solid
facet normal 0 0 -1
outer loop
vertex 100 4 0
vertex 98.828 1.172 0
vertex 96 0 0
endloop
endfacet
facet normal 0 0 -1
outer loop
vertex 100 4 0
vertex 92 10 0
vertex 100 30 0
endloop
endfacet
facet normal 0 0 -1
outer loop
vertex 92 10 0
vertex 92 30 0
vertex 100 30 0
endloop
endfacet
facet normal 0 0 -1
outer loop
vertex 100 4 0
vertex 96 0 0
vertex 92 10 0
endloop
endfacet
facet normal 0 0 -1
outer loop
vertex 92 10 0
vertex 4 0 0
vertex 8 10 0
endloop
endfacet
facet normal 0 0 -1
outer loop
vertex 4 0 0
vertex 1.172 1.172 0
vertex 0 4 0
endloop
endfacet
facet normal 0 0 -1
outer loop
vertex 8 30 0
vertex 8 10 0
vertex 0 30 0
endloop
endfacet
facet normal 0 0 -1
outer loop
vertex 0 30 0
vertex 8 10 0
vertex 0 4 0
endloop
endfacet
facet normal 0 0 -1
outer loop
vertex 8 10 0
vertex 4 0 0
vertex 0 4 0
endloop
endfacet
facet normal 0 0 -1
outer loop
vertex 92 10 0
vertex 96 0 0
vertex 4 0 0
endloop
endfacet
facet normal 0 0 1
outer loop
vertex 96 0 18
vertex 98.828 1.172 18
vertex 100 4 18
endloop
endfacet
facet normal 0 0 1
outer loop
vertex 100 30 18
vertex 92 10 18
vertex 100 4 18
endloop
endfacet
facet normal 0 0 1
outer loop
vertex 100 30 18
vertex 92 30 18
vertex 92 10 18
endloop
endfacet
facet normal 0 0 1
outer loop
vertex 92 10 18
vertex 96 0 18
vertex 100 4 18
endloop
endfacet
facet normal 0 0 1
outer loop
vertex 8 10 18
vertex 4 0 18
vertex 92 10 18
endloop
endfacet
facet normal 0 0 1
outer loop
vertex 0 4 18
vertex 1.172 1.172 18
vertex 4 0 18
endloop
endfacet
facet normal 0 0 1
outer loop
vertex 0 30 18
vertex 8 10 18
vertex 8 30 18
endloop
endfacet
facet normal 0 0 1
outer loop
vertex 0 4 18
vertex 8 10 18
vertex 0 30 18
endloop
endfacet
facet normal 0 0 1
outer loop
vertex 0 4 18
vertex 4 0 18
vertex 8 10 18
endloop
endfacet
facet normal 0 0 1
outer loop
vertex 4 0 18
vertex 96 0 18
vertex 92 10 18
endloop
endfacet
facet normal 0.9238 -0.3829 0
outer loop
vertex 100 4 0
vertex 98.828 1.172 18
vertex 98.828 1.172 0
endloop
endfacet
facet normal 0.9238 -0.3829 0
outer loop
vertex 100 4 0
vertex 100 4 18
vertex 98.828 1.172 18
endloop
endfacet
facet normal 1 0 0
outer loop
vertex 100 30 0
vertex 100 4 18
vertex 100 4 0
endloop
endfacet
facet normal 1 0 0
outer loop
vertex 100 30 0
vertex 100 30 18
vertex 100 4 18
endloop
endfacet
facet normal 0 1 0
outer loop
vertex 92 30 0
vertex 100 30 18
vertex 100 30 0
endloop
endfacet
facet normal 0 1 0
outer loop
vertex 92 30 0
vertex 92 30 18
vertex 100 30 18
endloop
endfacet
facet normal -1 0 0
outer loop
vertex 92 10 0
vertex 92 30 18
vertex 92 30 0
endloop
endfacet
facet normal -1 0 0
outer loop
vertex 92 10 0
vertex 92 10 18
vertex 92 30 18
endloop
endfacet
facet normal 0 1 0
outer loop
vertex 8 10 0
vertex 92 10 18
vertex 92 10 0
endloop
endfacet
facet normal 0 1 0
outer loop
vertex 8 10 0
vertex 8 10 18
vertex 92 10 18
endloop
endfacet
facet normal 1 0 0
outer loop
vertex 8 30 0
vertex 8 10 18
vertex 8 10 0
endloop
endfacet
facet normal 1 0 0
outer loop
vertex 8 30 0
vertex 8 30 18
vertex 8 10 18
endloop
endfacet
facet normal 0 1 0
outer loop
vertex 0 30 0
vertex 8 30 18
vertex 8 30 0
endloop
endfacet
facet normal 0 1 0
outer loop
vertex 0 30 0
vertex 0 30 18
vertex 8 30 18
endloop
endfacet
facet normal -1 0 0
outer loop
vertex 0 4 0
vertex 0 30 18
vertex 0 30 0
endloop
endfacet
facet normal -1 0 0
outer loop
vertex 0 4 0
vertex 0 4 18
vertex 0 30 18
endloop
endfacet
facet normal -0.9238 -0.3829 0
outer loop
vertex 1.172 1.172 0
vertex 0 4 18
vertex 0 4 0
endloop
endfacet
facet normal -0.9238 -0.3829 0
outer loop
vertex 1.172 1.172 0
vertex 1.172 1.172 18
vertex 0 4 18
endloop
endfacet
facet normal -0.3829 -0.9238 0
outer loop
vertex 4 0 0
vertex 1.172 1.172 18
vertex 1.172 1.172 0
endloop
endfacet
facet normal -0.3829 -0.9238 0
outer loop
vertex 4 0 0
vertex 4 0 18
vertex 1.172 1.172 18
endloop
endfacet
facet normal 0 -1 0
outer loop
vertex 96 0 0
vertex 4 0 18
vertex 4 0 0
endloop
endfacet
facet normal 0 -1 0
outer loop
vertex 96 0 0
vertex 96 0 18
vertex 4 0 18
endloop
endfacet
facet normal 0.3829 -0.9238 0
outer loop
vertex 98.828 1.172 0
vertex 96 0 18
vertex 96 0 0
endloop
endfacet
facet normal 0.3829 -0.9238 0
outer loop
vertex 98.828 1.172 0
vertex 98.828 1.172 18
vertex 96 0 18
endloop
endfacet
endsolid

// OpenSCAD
$fn = 32;

// ----------------------------------------------------------------------
// Heat sink frame: 100 x 30 mm frame, 8 mm walls
// ----------------------------------------------------------------------

// --- parameters (mm) ---
profile_height = 18;      // extrusion height
profile_points = 12;      // points of the closed outline

profile = [[0, 4], [1.172, 1.172], [4, 0], [96, 0], [98.828, 1.172], [100, 4], [100, 30], [92, 30], [92, 10], [8, 10], [8, 30], [0, 30]];  // single closed polygon, 12 points, counter clockwise

// --- the one profile operation ---
linear_extrude(height = profile_height) polygon(points = profile);
